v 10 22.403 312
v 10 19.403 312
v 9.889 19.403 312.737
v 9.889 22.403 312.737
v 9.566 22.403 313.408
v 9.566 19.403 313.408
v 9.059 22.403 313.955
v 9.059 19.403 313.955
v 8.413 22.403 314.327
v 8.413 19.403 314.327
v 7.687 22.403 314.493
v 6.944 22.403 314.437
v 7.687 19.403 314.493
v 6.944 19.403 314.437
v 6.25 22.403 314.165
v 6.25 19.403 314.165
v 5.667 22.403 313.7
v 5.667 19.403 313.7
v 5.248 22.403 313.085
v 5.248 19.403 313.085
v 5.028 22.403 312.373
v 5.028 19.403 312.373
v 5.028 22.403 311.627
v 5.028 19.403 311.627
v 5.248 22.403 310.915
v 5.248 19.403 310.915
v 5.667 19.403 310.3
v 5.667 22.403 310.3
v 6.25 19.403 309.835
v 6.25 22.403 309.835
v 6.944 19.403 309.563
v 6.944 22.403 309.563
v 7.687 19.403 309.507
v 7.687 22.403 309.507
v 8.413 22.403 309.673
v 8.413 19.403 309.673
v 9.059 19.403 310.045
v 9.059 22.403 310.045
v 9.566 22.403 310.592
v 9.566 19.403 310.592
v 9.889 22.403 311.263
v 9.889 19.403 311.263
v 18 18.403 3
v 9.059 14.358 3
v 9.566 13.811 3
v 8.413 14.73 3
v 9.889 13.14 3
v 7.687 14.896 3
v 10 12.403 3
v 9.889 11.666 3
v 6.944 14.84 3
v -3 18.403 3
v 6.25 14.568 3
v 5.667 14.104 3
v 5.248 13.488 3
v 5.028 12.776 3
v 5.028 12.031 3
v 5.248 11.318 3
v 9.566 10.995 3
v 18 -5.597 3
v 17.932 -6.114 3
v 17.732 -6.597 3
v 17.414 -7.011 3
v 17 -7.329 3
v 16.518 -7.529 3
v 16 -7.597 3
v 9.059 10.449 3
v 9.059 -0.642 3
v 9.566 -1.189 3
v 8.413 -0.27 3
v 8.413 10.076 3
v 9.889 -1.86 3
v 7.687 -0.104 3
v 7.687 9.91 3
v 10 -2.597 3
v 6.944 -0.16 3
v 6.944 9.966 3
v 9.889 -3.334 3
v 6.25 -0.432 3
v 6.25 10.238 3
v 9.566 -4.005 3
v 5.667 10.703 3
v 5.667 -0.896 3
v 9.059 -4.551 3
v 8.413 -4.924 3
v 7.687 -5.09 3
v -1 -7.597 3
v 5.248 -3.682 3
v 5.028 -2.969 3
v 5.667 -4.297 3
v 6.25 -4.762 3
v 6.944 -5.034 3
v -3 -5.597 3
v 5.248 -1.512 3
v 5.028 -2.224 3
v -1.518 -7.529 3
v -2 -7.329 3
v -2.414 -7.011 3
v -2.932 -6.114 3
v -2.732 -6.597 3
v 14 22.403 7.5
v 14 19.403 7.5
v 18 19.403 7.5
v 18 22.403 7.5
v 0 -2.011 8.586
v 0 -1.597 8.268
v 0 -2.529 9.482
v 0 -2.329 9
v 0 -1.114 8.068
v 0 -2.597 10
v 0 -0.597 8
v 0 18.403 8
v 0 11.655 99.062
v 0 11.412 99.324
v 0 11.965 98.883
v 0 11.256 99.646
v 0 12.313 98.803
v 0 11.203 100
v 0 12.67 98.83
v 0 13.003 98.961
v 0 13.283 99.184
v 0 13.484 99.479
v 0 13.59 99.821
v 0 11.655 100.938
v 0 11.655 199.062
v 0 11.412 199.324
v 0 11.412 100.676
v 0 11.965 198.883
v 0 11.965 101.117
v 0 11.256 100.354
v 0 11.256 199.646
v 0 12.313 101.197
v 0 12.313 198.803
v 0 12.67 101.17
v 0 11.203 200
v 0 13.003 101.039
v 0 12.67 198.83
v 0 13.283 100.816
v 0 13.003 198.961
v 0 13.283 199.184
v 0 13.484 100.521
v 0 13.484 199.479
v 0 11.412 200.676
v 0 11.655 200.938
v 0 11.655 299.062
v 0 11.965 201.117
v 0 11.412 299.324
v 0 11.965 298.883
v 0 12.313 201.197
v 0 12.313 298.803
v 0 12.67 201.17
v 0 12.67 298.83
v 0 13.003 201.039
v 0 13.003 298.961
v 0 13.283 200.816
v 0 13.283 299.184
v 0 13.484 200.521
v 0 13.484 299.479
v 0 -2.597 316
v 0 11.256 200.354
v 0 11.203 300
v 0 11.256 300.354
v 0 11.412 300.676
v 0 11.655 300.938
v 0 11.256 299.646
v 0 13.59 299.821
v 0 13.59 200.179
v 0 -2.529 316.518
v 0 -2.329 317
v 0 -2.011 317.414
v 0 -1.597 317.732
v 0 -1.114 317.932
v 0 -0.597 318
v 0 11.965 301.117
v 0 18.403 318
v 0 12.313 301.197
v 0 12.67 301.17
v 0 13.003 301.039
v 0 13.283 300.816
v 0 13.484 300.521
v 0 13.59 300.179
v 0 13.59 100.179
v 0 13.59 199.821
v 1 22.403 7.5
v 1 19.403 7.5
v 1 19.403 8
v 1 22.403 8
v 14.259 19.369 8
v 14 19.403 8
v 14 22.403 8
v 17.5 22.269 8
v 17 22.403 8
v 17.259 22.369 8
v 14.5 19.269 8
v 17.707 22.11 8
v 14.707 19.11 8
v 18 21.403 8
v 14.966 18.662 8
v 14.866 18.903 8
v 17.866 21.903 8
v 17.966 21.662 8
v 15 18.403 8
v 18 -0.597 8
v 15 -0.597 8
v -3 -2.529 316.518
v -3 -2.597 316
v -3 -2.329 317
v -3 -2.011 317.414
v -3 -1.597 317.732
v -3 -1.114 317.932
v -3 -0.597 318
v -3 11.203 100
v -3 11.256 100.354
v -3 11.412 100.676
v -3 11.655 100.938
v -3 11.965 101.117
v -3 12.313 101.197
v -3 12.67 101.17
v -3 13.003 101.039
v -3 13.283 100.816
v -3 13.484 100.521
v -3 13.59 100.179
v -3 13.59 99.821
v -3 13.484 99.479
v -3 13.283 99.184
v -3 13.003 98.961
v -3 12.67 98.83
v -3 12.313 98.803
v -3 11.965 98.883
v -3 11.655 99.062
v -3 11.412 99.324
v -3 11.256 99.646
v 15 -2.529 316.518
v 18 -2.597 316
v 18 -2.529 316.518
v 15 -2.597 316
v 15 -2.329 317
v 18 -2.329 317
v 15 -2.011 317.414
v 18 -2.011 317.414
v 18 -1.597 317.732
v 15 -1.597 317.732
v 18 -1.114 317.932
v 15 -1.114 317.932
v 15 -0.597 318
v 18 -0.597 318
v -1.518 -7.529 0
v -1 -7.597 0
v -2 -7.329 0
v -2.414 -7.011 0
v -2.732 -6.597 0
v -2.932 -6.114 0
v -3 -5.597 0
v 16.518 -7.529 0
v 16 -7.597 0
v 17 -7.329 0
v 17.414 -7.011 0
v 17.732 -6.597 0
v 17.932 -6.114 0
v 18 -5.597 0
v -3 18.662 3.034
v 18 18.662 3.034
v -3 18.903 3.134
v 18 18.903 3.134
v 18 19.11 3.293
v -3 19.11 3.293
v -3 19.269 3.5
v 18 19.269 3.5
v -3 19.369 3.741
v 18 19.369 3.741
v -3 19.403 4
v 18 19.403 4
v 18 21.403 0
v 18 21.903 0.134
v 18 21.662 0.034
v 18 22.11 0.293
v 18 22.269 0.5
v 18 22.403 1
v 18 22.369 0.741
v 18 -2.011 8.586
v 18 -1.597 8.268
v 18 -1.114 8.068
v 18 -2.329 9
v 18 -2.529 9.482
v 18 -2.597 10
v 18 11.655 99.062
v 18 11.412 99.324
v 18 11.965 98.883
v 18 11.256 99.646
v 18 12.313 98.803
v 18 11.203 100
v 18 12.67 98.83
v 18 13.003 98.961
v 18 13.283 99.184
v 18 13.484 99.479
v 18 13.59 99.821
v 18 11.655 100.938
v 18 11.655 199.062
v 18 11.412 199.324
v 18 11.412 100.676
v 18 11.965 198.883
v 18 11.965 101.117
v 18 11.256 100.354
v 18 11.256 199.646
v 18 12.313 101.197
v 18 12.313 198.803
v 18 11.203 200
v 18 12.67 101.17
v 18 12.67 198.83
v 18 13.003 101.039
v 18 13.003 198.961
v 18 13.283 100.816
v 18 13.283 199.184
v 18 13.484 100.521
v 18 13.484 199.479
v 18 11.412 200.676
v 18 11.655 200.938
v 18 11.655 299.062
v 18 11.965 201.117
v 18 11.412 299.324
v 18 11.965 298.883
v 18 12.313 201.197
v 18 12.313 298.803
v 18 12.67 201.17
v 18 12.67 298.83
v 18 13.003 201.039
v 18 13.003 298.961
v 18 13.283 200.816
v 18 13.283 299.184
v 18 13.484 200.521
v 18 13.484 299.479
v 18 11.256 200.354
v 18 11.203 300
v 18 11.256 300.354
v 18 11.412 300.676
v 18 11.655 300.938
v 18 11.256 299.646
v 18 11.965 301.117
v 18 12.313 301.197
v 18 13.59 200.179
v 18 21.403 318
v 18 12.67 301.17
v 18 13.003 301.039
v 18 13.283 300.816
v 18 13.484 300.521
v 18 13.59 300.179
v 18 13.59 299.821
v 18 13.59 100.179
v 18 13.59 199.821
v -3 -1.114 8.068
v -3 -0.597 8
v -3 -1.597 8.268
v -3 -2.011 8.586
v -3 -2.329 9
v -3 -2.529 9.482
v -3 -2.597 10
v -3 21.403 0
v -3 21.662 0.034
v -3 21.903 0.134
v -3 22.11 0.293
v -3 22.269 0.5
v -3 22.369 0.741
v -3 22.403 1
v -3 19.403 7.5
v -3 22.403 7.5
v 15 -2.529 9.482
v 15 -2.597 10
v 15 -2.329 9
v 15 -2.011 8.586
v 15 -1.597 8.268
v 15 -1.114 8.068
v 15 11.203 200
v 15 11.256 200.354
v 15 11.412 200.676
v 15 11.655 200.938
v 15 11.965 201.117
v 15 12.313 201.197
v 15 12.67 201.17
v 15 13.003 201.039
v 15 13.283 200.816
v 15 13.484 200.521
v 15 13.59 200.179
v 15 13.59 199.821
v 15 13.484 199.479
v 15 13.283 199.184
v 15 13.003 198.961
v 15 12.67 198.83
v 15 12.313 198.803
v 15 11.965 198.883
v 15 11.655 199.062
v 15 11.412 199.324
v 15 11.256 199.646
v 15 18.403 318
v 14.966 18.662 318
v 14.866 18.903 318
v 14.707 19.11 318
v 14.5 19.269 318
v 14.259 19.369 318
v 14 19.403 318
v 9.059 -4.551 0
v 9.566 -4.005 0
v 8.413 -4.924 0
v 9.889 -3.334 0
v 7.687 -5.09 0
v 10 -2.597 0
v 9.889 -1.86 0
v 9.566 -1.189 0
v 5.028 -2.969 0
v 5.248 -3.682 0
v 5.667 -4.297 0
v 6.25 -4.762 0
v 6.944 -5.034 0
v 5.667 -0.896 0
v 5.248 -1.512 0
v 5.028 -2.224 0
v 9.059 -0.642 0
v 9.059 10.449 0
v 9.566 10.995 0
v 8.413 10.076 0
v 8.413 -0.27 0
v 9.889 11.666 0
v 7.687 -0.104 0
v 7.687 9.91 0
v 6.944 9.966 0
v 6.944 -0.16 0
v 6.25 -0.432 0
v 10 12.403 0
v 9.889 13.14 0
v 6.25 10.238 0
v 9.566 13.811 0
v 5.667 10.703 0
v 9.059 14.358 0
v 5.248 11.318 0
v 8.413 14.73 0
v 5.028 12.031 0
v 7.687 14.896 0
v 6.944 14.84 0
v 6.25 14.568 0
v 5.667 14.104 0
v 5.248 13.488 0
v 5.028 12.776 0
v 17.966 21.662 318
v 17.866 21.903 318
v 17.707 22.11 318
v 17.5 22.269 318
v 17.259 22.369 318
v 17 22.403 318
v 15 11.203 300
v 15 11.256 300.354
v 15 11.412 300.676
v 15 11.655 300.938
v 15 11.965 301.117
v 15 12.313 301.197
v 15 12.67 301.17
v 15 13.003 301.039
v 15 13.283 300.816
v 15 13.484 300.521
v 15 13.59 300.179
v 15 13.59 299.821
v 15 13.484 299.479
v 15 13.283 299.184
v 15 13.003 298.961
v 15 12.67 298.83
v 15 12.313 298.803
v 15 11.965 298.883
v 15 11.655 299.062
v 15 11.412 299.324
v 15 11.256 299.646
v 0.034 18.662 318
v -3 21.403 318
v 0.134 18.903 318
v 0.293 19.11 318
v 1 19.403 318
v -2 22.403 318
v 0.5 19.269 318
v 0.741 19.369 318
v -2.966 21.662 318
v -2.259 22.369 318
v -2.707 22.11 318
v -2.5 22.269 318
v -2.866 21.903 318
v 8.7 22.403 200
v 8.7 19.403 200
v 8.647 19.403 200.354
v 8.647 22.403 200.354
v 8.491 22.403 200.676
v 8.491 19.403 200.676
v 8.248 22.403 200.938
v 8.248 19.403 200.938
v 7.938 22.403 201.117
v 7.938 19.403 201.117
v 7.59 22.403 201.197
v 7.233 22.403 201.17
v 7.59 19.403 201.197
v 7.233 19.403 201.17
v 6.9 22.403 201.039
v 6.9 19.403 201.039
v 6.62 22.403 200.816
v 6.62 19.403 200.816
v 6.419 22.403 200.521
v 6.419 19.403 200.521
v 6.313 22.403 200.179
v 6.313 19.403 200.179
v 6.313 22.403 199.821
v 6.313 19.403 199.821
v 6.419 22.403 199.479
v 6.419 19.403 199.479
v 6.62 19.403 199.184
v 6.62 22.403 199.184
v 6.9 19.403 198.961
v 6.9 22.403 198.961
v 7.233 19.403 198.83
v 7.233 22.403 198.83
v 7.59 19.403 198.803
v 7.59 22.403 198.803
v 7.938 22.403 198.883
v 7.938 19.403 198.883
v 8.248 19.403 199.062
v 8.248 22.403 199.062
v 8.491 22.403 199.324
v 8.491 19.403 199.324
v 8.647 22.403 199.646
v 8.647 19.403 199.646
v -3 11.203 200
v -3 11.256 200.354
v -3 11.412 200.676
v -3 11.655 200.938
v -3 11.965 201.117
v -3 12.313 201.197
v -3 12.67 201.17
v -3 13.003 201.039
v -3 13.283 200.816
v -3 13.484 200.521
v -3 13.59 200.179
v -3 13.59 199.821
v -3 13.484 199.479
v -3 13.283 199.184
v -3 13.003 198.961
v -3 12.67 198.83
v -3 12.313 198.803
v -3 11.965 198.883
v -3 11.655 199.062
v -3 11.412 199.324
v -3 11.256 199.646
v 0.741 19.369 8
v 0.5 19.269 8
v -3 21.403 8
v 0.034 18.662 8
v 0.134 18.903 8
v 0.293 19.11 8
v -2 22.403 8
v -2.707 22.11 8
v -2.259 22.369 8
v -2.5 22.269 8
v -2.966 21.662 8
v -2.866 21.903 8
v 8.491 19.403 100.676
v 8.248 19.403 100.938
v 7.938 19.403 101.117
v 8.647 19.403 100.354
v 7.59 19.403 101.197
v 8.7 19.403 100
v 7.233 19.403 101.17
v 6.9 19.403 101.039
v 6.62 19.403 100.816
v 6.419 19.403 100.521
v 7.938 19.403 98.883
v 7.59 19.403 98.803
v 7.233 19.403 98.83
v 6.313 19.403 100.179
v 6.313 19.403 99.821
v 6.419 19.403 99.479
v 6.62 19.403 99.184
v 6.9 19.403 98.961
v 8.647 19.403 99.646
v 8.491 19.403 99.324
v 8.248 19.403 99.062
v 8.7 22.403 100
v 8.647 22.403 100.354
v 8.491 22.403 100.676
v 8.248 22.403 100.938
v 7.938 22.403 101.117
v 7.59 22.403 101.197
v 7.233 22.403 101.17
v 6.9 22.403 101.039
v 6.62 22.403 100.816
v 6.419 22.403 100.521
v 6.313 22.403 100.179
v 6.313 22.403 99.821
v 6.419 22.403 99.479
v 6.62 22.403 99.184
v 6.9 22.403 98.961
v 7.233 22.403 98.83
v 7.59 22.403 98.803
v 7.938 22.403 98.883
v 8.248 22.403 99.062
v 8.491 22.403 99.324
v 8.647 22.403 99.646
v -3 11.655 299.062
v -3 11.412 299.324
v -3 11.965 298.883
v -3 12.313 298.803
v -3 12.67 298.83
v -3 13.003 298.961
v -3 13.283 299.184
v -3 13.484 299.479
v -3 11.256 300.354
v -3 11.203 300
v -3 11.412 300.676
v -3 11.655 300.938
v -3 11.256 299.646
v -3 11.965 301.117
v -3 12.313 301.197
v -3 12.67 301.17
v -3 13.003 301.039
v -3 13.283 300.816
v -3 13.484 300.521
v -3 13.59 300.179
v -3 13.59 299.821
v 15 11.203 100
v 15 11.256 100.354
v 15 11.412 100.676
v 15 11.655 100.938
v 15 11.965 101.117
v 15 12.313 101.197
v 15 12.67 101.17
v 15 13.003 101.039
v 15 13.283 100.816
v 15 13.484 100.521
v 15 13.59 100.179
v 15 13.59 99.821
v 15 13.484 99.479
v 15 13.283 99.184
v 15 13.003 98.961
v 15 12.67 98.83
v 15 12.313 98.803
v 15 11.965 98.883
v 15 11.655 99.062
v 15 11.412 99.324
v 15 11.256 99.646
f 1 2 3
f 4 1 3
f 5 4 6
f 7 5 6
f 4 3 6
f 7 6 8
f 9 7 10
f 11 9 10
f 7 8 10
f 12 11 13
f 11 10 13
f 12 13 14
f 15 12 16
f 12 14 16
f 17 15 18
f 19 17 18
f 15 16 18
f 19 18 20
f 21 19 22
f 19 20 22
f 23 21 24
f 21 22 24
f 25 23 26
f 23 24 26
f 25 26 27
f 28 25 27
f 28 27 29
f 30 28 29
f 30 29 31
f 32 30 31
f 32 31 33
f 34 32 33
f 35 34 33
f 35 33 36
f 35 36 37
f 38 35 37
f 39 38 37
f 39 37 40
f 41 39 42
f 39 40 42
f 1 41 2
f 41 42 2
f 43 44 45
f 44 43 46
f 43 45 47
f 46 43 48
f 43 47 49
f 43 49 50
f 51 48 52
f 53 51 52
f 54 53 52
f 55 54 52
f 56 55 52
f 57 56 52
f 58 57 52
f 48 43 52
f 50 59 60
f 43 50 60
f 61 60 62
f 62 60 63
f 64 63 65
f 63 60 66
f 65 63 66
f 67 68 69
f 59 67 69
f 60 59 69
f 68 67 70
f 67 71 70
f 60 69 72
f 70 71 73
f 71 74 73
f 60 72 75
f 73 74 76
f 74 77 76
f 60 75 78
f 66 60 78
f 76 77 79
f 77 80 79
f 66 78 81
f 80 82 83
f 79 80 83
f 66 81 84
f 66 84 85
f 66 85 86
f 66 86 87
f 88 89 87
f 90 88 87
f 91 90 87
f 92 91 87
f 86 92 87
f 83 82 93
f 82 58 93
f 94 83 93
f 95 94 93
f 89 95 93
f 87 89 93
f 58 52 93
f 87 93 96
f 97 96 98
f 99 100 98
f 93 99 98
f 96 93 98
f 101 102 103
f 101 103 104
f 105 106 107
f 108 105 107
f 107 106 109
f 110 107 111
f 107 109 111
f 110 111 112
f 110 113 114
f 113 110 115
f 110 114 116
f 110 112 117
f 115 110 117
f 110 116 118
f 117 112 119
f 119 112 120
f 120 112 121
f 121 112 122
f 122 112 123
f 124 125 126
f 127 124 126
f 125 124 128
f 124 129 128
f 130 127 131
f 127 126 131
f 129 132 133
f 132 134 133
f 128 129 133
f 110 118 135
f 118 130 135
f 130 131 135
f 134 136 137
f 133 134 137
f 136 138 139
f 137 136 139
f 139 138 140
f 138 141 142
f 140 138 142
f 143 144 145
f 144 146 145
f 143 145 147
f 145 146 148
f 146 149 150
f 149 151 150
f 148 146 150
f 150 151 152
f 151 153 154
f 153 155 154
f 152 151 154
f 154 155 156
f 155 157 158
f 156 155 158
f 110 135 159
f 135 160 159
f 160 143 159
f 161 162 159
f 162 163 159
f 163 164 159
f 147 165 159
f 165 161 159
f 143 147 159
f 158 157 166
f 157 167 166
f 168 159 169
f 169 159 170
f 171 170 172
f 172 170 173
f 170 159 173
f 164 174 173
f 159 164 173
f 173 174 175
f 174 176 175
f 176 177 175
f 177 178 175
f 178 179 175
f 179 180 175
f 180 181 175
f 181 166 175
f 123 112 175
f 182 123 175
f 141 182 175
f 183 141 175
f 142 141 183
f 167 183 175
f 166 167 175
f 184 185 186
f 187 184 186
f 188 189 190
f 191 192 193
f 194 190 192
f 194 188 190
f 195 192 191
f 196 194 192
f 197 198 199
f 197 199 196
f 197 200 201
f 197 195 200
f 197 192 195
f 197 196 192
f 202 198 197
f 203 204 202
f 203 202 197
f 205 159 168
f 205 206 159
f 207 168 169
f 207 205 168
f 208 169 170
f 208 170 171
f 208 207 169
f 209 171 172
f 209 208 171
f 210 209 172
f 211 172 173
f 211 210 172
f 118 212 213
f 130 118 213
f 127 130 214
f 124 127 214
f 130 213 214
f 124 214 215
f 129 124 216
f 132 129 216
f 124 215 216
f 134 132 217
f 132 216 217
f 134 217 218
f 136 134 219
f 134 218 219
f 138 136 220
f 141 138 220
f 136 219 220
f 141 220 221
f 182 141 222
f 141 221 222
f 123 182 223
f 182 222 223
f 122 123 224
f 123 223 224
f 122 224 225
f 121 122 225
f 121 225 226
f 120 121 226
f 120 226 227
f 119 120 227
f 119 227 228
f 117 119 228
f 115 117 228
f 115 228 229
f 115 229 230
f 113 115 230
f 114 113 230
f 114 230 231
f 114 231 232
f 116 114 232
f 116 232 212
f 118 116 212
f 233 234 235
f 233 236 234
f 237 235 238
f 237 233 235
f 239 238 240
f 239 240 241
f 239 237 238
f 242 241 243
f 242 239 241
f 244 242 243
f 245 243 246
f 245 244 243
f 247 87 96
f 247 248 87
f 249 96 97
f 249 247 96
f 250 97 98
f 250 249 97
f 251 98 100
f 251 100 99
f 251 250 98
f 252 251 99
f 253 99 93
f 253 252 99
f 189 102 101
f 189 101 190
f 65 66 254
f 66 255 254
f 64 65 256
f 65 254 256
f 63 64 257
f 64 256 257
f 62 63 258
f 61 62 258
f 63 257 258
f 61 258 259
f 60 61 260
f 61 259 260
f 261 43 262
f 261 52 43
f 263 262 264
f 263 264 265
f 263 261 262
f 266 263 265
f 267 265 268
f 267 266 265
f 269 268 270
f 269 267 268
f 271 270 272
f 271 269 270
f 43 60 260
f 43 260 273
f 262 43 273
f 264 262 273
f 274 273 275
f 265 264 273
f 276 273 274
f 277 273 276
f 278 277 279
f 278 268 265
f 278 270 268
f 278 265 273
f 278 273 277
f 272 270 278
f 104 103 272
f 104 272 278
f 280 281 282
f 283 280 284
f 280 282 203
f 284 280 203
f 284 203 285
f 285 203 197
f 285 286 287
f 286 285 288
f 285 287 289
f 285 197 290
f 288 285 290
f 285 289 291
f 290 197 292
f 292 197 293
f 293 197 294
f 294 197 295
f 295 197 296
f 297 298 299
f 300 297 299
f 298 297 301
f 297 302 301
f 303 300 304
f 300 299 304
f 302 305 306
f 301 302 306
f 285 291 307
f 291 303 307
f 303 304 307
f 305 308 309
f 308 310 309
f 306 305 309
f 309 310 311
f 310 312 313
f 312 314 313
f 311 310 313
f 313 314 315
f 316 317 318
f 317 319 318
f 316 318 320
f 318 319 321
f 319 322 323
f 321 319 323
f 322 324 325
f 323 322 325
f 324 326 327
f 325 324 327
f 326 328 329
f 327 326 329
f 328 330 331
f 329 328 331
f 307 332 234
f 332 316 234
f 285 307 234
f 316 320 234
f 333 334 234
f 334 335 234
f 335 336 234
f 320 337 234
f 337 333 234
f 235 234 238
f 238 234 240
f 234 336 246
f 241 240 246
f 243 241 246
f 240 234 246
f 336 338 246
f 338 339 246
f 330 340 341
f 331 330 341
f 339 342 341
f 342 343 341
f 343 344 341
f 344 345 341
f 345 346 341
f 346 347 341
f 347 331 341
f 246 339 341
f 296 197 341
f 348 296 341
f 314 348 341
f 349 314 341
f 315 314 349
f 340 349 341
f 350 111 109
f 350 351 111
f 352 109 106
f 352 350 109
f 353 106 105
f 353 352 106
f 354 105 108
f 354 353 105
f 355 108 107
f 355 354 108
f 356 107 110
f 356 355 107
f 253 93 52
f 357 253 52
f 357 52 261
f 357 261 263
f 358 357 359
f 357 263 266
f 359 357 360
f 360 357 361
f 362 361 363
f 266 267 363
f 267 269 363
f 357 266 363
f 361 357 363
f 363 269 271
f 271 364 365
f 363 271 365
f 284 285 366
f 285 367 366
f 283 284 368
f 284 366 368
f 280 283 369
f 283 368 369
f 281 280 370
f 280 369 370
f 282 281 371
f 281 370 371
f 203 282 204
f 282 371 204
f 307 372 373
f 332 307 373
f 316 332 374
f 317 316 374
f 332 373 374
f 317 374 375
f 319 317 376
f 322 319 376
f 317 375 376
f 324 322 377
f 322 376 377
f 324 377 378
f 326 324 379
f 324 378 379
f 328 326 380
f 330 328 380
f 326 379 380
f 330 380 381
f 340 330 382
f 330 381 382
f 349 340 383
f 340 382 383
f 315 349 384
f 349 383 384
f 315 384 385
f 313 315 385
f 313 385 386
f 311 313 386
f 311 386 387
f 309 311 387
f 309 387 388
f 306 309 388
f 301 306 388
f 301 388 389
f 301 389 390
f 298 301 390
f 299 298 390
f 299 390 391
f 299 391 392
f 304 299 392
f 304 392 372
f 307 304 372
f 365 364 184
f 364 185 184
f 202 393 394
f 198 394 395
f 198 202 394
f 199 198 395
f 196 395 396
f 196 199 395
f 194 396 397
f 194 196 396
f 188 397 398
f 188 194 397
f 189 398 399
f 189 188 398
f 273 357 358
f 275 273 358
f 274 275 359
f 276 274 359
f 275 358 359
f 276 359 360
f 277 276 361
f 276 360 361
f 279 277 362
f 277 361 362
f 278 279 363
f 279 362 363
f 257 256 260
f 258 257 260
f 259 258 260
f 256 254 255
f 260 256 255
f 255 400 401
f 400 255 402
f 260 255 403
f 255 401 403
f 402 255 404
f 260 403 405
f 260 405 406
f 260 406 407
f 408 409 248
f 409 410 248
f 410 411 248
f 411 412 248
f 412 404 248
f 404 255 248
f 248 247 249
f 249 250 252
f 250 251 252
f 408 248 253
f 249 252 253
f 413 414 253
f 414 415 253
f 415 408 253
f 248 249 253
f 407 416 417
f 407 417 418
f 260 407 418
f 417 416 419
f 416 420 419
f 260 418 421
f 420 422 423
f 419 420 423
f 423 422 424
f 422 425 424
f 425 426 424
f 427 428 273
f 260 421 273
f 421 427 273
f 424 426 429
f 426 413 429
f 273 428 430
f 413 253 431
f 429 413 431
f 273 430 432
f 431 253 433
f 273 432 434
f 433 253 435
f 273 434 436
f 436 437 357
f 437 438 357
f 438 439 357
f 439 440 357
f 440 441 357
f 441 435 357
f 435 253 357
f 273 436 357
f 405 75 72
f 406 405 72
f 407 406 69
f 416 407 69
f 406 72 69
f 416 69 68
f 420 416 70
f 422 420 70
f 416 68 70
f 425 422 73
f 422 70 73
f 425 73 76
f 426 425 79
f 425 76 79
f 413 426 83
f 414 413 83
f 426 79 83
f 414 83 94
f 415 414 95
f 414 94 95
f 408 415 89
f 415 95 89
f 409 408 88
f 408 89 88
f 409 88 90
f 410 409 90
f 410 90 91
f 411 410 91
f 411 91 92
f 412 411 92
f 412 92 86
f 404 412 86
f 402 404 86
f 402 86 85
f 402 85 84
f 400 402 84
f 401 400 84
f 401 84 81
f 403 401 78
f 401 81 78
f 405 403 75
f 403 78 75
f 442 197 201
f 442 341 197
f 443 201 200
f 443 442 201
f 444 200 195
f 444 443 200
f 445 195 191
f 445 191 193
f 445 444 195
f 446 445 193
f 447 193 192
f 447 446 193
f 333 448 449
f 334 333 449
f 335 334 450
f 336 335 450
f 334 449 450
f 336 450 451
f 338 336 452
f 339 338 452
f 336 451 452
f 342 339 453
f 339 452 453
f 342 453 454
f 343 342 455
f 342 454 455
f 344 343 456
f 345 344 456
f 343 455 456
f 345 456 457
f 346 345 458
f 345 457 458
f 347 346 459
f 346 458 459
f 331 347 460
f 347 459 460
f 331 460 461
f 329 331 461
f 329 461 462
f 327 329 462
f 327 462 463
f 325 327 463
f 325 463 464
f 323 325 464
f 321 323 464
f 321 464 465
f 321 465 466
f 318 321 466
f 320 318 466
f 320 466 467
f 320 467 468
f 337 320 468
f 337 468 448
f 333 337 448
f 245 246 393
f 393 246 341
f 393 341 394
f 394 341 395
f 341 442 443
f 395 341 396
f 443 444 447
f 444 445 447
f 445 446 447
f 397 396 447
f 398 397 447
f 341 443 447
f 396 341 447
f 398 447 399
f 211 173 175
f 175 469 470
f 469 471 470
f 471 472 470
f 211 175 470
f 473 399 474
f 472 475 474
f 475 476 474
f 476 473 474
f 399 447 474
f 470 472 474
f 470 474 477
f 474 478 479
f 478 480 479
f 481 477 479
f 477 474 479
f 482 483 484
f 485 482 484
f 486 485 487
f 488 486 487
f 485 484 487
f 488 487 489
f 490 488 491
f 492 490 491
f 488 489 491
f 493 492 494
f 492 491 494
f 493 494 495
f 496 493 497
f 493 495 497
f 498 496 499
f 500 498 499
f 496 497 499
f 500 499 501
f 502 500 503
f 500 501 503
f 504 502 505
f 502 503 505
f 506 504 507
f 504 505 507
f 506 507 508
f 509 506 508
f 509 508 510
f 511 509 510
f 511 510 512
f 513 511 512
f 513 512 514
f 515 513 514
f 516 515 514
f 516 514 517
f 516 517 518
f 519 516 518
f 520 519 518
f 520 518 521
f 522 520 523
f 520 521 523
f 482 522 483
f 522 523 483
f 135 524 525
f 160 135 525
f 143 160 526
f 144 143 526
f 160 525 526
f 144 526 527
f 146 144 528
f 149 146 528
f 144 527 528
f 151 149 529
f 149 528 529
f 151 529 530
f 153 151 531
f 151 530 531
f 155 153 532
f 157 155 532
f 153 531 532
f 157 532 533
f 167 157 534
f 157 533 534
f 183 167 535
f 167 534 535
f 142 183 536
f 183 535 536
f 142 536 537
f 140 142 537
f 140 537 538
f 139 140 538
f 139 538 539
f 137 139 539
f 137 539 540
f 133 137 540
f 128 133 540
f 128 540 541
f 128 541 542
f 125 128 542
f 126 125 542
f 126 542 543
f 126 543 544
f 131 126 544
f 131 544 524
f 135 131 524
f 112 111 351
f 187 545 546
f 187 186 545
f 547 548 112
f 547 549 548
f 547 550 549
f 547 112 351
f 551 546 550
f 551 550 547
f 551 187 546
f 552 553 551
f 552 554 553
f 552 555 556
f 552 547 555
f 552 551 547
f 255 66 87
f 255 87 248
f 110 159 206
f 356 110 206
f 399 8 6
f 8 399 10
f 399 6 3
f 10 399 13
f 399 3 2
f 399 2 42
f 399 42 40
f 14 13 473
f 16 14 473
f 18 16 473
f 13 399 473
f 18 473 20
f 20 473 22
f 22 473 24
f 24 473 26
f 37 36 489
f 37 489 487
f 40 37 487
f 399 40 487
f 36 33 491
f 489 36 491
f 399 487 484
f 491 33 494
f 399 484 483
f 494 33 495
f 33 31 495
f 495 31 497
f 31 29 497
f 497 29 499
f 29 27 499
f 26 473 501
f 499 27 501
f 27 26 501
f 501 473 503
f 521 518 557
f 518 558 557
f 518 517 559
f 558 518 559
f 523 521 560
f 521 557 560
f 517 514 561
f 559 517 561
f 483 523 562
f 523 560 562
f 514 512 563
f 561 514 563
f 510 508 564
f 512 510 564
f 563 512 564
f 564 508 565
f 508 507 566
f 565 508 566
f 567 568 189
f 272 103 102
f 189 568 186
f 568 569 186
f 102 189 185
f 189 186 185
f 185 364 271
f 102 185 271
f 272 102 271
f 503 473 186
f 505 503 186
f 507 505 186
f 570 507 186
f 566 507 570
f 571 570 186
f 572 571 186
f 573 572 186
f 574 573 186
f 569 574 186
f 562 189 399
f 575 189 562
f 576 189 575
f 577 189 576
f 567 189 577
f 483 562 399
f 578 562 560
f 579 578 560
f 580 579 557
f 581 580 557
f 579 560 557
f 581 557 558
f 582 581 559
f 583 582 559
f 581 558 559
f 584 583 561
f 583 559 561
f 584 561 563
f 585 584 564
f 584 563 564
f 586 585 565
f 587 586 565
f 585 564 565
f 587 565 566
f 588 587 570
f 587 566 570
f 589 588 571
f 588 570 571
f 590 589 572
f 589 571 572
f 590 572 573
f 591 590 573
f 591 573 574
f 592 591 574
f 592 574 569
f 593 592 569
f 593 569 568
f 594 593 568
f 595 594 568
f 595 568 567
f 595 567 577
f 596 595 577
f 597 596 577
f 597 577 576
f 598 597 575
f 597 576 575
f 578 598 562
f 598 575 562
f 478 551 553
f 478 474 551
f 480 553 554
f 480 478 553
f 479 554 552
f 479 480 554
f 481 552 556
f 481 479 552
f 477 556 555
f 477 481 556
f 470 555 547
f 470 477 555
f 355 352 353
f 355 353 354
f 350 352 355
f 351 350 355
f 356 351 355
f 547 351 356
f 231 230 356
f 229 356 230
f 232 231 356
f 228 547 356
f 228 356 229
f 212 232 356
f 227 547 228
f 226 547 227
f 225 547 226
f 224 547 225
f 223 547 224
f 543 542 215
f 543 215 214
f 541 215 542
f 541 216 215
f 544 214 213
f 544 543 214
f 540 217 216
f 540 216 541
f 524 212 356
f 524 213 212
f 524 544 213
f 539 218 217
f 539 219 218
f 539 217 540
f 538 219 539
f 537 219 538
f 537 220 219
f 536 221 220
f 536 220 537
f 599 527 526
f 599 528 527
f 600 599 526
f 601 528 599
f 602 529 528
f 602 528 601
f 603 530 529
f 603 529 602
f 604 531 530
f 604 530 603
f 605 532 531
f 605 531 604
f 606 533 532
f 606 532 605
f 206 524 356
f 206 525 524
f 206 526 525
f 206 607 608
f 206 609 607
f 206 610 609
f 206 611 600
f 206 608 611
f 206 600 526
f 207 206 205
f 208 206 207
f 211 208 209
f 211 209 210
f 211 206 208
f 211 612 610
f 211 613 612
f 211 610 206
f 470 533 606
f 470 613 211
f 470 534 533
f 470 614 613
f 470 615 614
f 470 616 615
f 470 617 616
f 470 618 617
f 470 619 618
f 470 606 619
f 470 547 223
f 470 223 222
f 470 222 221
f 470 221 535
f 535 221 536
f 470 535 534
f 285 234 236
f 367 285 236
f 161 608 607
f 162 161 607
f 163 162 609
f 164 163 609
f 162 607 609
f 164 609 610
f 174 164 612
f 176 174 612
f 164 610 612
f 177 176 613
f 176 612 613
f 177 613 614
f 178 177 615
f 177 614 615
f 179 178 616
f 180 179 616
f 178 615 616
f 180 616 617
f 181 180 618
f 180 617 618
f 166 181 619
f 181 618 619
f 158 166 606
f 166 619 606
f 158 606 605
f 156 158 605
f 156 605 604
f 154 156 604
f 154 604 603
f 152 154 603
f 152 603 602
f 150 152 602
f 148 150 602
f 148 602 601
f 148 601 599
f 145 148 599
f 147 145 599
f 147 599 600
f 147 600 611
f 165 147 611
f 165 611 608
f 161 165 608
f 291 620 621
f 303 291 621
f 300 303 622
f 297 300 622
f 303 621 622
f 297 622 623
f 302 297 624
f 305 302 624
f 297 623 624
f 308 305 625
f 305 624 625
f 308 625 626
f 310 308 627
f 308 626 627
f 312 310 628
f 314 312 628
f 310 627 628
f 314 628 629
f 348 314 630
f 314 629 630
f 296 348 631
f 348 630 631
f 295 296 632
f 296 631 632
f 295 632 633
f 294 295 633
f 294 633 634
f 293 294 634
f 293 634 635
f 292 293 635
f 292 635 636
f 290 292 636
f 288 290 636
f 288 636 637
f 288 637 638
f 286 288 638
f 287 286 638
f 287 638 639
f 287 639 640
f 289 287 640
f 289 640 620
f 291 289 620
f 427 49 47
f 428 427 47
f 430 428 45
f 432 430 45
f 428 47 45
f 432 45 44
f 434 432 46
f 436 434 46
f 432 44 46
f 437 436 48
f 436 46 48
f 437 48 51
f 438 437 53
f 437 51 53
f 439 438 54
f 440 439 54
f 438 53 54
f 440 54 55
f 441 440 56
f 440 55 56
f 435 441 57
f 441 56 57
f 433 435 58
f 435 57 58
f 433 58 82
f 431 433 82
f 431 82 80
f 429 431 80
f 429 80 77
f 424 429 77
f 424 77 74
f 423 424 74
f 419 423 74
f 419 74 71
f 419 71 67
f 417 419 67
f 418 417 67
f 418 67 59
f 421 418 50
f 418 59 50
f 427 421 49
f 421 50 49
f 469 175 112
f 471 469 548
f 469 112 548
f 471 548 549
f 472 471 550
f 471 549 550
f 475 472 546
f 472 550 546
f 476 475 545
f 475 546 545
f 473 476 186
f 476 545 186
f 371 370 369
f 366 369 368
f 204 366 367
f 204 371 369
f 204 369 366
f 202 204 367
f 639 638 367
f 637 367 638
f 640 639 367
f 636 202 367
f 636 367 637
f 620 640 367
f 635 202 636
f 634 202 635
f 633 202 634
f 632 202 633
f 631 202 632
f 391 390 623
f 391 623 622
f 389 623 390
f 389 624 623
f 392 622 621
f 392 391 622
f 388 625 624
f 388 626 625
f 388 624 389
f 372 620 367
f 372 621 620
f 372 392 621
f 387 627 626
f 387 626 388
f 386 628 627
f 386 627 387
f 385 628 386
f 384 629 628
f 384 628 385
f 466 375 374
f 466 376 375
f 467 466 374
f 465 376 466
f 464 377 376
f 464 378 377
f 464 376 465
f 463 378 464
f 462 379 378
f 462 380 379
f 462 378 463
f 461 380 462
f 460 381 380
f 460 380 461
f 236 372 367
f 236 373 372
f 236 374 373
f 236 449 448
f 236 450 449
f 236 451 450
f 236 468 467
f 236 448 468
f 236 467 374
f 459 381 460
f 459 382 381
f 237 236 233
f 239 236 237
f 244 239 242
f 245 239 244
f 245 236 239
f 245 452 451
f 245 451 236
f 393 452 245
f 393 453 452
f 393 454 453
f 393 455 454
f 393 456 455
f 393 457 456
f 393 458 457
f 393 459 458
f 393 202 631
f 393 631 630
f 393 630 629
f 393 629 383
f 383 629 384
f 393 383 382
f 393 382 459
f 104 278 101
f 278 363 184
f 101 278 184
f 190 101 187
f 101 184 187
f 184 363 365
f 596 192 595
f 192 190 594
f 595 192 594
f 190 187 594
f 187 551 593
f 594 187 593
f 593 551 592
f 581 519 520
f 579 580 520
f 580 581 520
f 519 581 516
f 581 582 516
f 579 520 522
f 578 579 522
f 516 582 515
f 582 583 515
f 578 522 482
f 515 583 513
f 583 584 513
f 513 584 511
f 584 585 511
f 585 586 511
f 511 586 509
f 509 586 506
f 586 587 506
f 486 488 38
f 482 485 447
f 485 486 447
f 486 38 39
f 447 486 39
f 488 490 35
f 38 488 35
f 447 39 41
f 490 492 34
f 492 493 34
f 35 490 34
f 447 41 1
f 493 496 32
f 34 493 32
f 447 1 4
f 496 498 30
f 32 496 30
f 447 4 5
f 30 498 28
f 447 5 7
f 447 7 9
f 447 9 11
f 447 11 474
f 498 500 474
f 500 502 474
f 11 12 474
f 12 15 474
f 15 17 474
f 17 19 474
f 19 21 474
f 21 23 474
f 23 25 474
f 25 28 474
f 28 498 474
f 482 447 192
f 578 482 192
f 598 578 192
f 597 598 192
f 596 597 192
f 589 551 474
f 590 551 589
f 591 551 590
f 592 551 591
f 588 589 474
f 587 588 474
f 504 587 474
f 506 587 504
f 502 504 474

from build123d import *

# Parameters (mm, degrees)
F1_DEPTH  = 15
F2_W      = 3
F2_H      = 310
F3_DEPTH  = 25
F4_R      = 2.5
F5_DEPTH  = 3
F6_W      = 1
F6_H      = 0.5
F7_DEPTH  = 3
F8_R      = 1
F9_R      = 2.5
F9_R_2    = 1.2
F10_DEPTH = 3
F11_R     = 1.2
F12_DEPTH = 34.2
F13_DEPTH = 3
F14_DEPTH = 3
F15_R     = 2


with BuildPart() as f1:
    # F0 (on Right) → F1 (new body)
    with BuildSketch(Plane.YZ):
        Polygon((-7.5968508422, 3), (-7.5968508422, 0), (22.4031491578, 0), (22.4031491578, 318), (19.4031491578, 318), (19.4031491578, 3), align=None)
    extrude(amount=F1_DEPTH)

    # F2 (on face) → F3 (join)
    with BuildSketch(Plane(origin=(0, 22.4031491578, 0), x_dir=(-1, 0, 0), z_dir=(0, 1, 0))):
        with Locations((1.5, 163)):
            Rectangle(F2_W, F2_H)
        with Locations((-16.5, 163)):
            Rectangle(F2_W, F2_H)
    extrude(amount=-F3_DEPTH)

    # F4 (on face) → F5 (cut)
    with BuildSketch(Plane.XY.offset(3)):
        with Locations((7.5, -2.5968508422)):
            Circle(F4_R)
        with Locations((7.5, 12.4031491578)):
            Circle(F4_R)
    extrude(amount=-F5_DEPTH, mode=Mode.SUBTRACT)

    # F6 (on face) → F7 (cut)
    with BuildSketch(Plane.XZ.offset(-19.4031491578)):
        with Locations((0.5, 7.75)):
            Rectangle(F6_W, F6_H)
        with Locations((14.5, 7.75)):
            Rectangle(F6_W, F6_H)
    extrude(amount=-F7_DEPTH, mode=Mode.SUBTRACT)

    # F8
    f8_edges = [f1.edges().sort_by_distance(p)[0] for p in [
        (7.5, 19.403149, 3),
        (7.5, 22.403149, 0),
        (0, 19.403149, 163),
        (-3, 22.403149, 163),
        (18, 22.403149, 163),
        (15, 19.403149, 163),
    ]]
    fillet(f8_edges, radius=F8_R)

    # F9 (on face) → F10 (cut)
    with BuildSketch(Plane.XZ.offset(-19.4031491578)):
        with Locations((7.5, 312)):
            Circle(F9_R)
        with Locations((7.5, 100)):
            Circle(F9_R_2)
        with Locations((7.5, 200)):
            Circle(F9_R_2)
    extrude(amount=-F10_DEPTH, mode=Mode.SUBTRACT)

    # F11 (on face) → F12 (cut)
    with BuildSketch(Plane(origin=(-3, 0, 0), x_dir=(0, -1, 0), z_dir=(-1, 0, 0))):
        with Locations((-12.4031491578, 300)):
            Circle(F11_R)
        with Locations((-12.4031491578, 100)):
            Circle(F11_R)
        with Locations((-12.4031491578, 200)):
            Circle(F11_R)
    extrude(amount=-F12_DEPTH, mode=Mode.SUBTRACT)

    # F13 (add): a face of the model
    f13_faces = [f1.faces().sort_by_distance(p)[0] for p in [
        (0, 9.1577983799, 1.9953507779),
    ]]
    extrude(f13_faces, amount=F13_DEPTH)

    # F14 (add): a face of the model
    f14_faces = [f1.faces().sort_by_distance(p)[0] for p in [
        (15, 9.1577983799, 1.9953507779),
    ]]
    extrude(f14_faces, amount=F14_DEPTH)

    # F15
    f15_edges = [f1.edges().sort_by_distance(p)[0] for p in [
        (-1.5, -2.596851, 8),
        (16.5, -2.596851, 8),
        (-3, -7.596851, 1.5),
        (18, -7.596851, 1.5),
        (-1.5, -2.596851, 318),
        (16.5, -2.596851, 318),
    ]]
    fillet(f15_edges, radius=F15_R)


solid = f1.part
